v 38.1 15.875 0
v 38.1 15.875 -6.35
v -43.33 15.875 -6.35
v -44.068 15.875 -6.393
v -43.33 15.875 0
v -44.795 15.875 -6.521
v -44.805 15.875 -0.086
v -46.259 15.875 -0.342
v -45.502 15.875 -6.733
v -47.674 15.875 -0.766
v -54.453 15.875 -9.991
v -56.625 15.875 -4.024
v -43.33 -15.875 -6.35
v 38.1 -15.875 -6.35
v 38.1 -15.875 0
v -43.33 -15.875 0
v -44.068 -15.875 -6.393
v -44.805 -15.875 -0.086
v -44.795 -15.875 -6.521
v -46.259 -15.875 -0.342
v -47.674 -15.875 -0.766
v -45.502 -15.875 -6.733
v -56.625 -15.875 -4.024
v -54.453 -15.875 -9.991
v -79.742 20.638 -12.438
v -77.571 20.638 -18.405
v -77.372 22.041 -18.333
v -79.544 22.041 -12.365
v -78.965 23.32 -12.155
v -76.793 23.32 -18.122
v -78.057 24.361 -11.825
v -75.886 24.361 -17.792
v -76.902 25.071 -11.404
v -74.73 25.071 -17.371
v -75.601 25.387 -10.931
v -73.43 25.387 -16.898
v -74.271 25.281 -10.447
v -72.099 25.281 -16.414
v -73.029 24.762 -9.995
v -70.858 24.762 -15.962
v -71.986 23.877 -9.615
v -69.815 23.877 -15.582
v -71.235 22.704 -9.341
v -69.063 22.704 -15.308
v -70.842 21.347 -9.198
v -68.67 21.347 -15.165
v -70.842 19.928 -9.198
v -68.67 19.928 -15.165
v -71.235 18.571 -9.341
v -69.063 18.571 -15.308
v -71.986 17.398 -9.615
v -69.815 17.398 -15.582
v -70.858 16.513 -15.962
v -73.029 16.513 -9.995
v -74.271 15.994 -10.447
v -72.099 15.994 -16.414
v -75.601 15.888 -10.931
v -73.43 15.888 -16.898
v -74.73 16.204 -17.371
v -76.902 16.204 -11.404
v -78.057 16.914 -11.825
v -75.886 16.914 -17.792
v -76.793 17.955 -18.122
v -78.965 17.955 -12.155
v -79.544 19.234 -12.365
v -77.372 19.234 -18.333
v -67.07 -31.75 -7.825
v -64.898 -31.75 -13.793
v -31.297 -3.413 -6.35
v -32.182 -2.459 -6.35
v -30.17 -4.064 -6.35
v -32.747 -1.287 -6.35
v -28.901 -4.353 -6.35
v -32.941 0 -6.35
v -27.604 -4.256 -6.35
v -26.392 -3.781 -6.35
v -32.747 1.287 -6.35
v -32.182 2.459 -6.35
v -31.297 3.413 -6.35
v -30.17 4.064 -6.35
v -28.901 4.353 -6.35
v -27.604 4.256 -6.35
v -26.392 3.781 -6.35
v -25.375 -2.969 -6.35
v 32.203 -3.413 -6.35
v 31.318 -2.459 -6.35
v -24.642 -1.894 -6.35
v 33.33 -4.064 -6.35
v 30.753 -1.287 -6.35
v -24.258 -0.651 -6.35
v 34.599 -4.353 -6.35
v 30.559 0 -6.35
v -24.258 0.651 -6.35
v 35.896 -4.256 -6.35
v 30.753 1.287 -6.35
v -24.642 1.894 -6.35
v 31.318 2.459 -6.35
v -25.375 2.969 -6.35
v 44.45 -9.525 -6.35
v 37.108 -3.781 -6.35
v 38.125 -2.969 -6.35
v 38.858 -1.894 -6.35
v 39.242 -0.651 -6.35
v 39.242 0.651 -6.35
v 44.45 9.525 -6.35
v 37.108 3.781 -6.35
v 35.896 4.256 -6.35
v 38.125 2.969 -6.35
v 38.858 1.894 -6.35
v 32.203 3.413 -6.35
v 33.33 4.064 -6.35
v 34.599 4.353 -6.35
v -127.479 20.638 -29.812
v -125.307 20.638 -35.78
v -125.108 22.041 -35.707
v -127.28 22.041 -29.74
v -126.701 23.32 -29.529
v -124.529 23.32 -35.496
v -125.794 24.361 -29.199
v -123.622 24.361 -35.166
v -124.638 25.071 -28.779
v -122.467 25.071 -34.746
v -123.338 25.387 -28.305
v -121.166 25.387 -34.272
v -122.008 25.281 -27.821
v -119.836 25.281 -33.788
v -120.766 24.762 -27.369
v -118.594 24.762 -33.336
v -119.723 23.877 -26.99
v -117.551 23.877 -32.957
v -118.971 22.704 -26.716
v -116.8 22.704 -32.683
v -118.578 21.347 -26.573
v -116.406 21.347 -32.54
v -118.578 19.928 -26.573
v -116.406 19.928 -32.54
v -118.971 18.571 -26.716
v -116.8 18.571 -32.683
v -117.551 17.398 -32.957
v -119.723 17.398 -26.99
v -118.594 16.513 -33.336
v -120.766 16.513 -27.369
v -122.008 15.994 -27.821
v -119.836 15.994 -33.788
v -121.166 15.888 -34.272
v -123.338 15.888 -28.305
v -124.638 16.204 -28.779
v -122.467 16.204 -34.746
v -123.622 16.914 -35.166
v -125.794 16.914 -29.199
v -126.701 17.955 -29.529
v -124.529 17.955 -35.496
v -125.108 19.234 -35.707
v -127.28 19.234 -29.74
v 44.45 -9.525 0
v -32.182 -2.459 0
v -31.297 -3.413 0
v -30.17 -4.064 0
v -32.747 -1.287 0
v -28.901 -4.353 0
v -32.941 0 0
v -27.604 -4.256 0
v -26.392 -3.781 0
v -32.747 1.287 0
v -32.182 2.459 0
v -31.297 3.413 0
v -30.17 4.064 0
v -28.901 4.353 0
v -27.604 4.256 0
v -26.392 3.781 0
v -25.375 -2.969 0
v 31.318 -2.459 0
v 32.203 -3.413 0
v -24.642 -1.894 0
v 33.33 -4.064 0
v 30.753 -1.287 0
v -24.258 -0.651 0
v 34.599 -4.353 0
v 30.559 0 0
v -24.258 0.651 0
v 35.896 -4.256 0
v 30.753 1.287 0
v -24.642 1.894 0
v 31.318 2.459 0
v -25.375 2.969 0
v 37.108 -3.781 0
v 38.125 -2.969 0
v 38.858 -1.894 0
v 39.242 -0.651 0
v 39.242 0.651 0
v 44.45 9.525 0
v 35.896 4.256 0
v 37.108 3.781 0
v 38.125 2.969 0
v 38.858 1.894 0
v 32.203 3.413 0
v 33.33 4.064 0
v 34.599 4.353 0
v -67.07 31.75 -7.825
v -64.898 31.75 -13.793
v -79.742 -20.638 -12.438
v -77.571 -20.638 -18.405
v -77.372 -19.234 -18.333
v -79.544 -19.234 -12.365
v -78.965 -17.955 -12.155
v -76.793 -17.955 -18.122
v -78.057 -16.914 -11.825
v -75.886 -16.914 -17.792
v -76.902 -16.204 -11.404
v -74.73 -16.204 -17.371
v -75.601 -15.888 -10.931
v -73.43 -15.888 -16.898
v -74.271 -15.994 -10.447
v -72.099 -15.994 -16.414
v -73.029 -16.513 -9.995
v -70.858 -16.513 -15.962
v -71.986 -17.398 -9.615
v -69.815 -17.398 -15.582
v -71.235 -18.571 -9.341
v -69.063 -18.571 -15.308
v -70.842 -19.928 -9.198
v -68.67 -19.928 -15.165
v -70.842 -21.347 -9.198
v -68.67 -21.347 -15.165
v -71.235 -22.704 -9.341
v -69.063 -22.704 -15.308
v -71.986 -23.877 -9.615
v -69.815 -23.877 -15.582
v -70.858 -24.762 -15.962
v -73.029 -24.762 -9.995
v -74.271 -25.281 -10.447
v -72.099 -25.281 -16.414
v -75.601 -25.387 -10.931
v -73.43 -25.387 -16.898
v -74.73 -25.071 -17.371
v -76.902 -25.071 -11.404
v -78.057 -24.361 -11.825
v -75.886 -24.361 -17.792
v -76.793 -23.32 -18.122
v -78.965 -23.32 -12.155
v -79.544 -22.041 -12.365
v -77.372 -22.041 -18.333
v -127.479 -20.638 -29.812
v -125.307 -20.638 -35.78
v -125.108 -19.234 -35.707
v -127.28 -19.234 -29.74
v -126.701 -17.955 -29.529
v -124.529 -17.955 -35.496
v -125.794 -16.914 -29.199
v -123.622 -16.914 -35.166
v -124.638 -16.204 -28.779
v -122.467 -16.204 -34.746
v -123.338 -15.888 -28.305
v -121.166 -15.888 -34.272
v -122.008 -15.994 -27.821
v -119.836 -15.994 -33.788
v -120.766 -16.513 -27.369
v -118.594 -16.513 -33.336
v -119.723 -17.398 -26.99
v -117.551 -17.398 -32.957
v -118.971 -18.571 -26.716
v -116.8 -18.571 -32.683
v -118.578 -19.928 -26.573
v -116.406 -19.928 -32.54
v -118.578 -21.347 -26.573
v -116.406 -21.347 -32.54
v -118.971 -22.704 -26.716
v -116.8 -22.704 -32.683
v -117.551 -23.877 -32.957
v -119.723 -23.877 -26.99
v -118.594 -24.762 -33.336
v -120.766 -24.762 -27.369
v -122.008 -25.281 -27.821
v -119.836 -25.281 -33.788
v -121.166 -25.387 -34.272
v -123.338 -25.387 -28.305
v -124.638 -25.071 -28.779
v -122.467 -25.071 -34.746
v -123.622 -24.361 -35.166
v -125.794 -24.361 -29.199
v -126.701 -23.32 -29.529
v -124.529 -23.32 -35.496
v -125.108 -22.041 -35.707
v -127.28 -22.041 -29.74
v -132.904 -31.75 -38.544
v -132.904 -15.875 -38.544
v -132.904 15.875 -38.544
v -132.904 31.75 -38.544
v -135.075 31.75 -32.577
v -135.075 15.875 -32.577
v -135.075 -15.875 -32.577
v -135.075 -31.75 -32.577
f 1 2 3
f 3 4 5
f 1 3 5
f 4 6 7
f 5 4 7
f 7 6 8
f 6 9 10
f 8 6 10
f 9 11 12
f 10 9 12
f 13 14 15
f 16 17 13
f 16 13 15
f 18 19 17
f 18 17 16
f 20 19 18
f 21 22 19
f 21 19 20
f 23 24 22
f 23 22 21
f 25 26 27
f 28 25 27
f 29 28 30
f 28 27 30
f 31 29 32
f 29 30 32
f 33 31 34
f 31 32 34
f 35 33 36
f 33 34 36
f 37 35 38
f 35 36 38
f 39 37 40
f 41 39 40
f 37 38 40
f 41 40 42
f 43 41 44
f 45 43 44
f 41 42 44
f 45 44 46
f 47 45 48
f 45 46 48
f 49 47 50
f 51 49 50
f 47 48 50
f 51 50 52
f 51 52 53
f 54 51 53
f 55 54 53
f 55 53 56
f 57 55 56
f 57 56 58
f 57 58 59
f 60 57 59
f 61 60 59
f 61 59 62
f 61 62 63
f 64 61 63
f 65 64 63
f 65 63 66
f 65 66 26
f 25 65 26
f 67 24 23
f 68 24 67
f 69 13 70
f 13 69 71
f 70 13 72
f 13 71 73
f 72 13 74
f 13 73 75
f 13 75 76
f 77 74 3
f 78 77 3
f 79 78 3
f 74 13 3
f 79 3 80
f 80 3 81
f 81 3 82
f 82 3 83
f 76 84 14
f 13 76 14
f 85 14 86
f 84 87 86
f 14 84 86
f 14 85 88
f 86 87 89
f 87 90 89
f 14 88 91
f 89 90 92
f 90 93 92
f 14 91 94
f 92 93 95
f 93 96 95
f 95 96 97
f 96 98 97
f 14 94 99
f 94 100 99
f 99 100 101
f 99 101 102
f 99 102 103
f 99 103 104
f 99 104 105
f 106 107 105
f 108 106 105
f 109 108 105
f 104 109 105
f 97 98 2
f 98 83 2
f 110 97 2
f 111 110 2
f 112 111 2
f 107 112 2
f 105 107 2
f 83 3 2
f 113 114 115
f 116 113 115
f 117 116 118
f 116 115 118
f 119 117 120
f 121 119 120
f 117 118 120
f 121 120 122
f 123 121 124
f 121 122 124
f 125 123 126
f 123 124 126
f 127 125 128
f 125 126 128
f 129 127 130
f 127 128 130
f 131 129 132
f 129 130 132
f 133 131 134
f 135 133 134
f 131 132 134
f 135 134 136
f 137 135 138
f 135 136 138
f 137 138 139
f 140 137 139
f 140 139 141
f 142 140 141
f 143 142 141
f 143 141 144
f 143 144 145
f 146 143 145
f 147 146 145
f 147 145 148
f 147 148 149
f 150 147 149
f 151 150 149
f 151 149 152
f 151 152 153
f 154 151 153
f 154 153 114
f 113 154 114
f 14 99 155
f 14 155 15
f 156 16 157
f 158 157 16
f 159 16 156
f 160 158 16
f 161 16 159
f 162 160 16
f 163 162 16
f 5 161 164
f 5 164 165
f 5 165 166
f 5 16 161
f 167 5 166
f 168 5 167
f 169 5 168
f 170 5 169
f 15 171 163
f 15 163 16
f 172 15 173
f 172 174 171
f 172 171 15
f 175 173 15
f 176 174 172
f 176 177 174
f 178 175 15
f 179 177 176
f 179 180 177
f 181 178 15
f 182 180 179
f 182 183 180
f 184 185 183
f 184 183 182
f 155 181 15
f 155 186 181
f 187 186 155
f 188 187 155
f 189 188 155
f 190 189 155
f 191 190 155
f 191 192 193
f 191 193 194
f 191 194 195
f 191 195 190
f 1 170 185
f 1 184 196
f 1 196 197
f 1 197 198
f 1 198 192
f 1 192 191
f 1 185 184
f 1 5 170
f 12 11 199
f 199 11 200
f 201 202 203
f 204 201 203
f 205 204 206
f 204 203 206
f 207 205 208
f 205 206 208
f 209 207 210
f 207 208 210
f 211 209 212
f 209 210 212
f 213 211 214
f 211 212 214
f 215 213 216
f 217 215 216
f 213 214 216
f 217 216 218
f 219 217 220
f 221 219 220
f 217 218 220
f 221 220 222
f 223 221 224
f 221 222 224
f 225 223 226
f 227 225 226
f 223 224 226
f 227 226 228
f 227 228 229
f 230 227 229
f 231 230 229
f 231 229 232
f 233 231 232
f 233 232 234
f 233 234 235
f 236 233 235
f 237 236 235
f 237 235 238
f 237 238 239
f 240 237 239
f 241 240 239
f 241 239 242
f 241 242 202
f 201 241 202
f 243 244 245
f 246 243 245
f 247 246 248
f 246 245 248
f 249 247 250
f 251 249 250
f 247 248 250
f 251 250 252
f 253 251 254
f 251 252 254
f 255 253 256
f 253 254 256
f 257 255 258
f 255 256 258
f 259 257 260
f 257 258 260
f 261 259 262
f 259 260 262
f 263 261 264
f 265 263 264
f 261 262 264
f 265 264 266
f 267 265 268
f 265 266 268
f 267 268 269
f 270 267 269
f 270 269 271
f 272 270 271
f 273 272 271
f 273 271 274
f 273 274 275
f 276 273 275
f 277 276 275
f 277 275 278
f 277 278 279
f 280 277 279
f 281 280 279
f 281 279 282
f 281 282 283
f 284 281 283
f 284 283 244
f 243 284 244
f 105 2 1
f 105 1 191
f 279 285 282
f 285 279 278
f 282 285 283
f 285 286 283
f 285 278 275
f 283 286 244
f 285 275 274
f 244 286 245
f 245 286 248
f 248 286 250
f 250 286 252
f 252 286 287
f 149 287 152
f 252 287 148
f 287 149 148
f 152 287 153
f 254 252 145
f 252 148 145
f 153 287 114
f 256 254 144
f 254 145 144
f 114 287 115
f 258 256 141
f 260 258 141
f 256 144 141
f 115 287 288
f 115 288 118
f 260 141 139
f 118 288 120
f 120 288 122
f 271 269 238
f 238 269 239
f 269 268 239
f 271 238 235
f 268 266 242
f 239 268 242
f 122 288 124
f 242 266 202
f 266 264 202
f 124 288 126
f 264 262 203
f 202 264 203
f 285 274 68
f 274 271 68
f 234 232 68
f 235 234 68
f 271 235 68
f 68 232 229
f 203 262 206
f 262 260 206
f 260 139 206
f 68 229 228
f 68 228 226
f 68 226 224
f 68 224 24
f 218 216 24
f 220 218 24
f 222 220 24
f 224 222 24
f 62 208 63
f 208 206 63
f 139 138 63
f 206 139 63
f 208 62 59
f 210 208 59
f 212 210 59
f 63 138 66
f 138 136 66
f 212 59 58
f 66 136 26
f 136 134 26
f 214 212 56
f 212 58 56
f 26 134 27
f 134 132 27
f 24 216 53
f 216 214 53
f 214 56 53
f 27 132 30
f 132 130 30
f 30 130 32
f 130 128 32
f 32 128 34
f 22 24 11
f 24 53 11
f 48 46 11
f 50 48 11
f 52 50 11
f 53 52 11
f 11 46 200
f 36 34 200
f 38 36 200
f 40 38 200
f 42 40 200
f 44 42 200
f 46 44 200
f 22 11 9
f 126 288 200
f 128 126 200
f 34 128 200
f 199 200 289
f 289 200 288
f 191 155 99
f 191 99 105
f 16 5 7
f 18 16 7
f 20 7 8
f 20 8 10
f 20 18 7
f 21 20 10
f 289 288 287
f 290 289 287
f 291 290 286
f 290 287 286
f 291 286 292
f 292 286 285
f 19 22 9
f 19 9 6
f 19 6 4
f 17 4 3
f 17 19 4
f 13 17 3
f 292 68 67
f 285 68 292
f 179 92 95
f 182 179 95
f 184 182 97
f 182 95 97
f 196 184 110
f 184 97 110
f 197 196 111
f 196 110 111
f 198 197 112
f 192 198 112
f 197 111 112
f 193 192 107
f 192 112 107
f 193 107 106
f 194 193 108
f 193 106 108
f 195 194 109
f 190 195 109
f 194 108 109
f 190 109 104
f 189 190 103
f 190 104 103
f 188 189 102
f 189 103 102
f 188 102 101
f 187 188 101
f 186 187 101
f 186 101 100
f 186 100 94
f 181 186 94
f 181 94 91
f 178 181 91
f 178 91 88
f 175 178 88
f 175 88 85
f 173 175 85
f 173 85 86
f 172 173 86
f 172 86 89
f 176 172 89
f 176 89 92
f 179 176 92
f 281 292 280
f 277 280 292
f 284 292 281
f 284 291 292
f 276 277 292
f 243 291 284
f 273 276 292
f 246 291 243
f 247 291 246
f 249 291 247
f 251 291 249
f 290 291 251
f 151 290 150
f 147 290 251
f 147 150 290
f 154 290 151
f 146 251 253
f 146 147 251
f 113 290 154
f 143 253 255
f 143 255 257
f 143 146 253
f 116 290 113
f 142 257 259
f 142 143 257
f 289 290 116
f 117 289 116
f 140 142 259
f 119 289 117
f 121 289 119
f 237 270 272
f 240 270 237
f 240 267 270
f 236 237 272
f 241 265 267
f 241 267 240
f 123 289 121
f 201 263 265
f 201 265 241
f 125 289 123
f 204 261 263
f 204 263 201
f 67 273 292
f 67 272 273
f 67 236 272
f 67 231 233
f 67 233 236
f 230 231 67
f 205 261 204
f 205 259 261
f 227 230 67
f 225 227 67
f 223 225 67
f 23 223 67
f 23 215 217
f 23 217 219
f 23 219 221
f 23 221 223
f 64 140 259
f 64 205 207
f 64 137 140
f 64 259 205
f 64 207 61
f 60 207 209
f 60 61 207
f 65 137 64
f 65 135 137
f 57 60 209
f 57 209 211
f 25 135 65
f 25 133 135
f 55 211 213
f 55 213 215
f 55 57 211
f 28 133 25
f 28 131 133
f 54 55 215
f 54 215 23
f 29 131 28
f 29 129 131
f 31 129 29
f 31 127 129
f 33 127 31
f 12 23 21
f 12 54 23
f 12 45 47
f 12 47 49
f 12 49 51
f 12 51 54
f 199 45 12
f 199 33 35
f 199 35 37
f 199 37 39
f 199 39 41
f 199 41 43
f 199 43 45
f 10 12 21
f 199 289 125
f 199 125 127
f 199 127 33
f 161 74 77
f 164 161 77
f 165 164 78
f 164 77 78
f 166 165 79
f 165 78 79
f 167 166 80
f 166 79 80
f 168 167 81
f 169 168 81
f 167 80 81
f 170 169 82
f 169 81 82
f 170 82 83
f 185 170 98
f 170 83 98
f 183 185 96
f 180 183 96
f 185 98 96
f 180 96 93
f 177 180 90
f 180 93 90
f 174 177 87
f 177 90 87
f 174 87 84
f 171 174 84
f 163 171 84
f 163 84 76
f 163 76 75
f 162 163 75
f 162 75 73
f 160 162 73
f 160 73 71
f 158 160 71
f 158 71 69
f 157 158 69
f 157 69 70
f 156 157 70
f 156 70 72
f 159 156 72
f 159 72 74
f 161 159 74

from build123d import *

# Parameters (mm, degrees)
SKETCH1_W                    = 88.9
SKETCH1_H                    = 31.75
BASE_FLANGE1_DEPTH           = 6.35
EDGE_FLANGE1_STRIP_CUT_DEPTH = 31.75
EDGE_FLANGE1_DEPTH           = 31.75
TAB1_DEPTH                   = 6.35
SKETCH12_R                   = 4.7625
CUT_EXTRUDE1_DEPTH           = 38.1
SKETCH13_R                   = 4.365625
CUT_EXTRUDE2_DEPTH           = 38.1
BREAK_CORNER1_START          = -6.35
BREAK_CORNER1_DEPTH          = 6.35


# Read off the part's stored shape, not the designer's step: Break-Corner1
# Sheet-metal steps are written as plain solids
with BuildPart() as part:
    # Sketch1 → Base-Flange1 (new body)
    with BuildSketch(Plane.XY):
        Rectangle(SKETCH1_W, SKETCH1_H)
    extrude(amount=-BASE_FLANGE1_DEPTH)

    # Edge-Flange1 strip (across the edge) → Edge-Flange1 strip cut (cut)
    with BuildSketch(Plane(origin=(-44.45, -15.875, -6.35), x_dir=(0.3420201433256631, 0, -0.9396926207859105), z_dir=(0, 1, 0))):
        Polygon((-18.615063745, 32.578309359), (-5.584096284, -3.223979493), (0.382951858, -1.052151583), (-12.648015603, 34.750137269), align=None)
    extrude(amount=EDGE_FLANGE1_STRIP_CUT_DEPTH, mode=Mode.SUBTRACT)

    # Edge-Flange1 section (across the edge) → Edge-Flange1 (add)
    with BuildSketch(Plane(origin=(-44.45, -15.875, -6.35), x_dir=(0.3420201433256631, 0, -0.9396926207859105), z_dir=(0, 1, 0))):
        with BuildLine():
            Line((-6.35, 1.119676327), (-6.35, 94.130323673))
            Line((-6.35, 94.130323673), (0, 94.130323673))
            Line((0, 94.130323673), (0, 1.119676327))
            ThreePointArc((0, 1.119676327), (0.096470768, 0.017010399), (0.382951858, -1.052151583))
            Line((0.382951858, -1.052151583), (-5.584096284, -3.223979493))
            ThreePointArc((-5.584096284, -3.223979493), (-6.157058463, -1.085655529), (-6.35, 1.119676327))
        make_face()
    extrude(amount=EDGE_FLANGE1_DEPTH)

    # Sketch9 → Tab1 (add)
    with BuildSketch(Plane(origin=(-3.158811591, 0, 8.678763518), x_dir=(-0.9396926207859105, 0, -0.342020143325663), z_dir=(0.342020143325663, 0, -0.9396926207859105))):
        Polygon((54.585841232, 15.875), (65.701635901, 31.75), (138.071488577, 31.75), (138.071488577, 15.875), align=None)
        Polygon((138.071488577, -31.75), (138.071488577, -15.875), (54.585841232, -15.875), (65.701635901, -31.75), align=None)
    extrude(amount=-TAB1_DEPTH)

    # Sketch12 → Cut-Extrude1 (cut)
    with BuildSketch(Plane(origin=(-3.158811591, 0, 8.678763518), x_dir=(-0.9396926207859104, 0, -0.34202014332566316), z_dir=(0.34202014332566316, 0, -0.9396926207859104))):
        with Locations((74.424778405, -20.6375)):
            Circle(SKETCH12_R)
        with Locations((125.224778405, -20.6375)):
            Circle(SKETCH12_R)
        with Locations((125.224778405, 20.6375)):
            Circle(SKETCH12_R)
        with Locations((74.424778405, 20.6375)):
            Circle(SKETCH12_R)
    extrude(amount=-CUT_EXTRUDE1_DEPTH, mode=Mode.SUBTRACT)

    # Sketch13 → Cut-Extrude2 (cut)
    with BuildSketch(Plane(origin=(0, 0, -6.35), x_dir=(-1, 0, 0), z_dir=(0, 0, -1))):
        with Locations((28.575, 0)):
            Circle(SKETCH13_R)
        with Locations((-34.925, 0)):
            Circle(SKETCH13_R)
    extrude(amount=-CUT_EXTRUDE2_DEPTH, mode=Mode.SUBTRACT)

    # Break-Corner1 outline → Break-Corner1 (cut)
    with BuildSketch(Plane.XY.offset(BREAK_CORNER1_START)):
        Polygon((44.45, -15.875), (44.45, -9.525), (38.1, -15.875), align=None)
        Polygon((38.1, 15.875), (44.45, 9.525), (44.45, 15.875), align=None)
    extrude(amount=BREAK_CORNER1_DEPTH, mode=Mode.SUBTRACT)


solid = part.part
